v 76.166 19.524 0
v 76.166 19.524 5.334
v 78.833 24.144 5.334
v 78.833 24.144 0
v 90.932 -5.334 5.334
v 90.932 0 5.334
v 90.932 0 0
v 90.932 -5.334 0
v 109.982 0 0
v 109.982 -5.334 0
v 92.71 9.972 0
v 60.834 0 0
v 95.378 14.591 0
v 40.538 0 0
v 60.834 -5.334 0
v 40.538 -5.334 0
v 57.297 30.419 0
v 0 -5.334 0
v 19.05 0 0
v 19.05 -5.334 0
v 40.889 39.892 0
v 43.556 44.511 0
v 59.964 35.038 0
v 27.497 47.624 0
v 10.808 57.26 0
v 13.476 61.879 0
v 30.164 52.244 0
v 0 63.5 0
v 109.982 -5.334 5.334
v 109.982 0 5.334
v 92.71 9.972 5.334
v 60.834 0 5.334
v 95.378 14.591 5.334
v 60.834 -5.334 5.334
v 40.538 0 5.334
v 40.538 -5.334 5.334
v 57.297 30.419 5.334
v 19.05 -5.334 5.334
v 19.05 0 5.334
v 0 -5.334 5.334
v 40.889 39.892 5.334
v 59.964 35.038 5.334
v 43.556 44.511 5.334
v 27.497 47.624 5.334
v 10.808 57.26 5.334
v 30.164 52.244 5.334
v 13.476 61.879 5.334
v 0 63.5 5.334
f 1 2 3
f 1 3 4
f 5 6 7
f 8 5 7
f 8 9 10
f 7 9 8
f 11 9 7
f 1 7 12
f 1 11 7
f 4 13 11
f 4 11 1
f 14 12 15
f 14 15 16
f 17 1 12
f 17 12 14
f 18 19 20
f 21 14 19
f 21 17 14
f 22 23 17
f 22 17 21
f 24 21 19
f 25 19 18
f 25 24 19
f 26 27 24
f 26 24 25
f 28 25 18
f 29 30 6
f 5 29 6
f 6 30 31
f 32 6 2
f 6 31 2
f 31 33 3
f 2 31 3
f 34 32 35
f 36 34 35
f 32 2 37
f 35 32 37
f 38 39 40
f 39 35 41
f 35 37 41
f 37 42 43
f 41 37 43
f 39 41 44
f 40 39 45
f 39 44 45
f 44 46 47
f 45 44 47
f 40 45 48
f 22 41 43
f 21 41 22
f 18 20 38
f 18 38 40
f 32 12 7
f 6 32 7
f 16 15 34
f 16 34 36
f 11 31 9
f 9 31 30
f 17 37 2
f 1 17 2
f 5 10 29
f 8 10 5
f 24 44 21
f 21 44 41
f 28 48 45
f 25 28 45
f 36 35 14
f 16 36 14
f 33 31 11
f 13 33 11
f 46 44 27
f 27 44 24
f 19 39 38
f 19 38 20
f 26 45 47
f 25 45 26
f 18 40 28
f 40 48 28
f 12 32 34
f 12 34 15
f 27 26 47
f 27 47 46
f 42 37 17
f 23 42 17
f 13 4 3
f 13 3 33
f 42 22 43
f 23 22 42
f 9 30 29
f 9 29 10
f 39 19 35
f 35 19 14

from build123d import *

# Parameters (mm, degrees)
SKETCH1_W           = 109.982
SKETCH1_H           = 63.5
BOSS_EXTRUDE1_DEPTH = 5.334
CUT_EXTRUDE1_DEPTH  = 128.109173076
SKETCH7_W           = 19.05
SKETCH7_H           = 5.334
SKETCH7_W_2         = 20.295839927
BOSS_EXTRUDE4_DEPTH = 5.334
SKETCH9_W           = 19.270046927
SKETCH9_H           = 5.334
SKETCH9_W_2         = 18.946166646
SKETCH9_W_3         = 19.104051368
BOSS_EXTRUDE6_DEPTH = 5.334


with BuildPart() as part:
    # Sketch1 → Boss-Extrude1 (new body)
    with BuildSketch(Plane.XY):
        with Locations((54.991, 31.75)):
            Rectangle(SKETCH1_W, SKETCH1_H)
    extrude(amount=BOSS_EXTRUDE1_DEPTH)

    # Sketch2 → Cut-Extrude1 (cut, through all)
    with BuildSketch(Plane.XY.offset(5.334)):
        Polygon((0, 63.5), (109.982, 0), (109.982, 63.5), align=None)
    extrude(amount=-CUT_EXTRUDE1_DEPTH, mode=Mode.SUBTRACT)

    # Sketch7 → Boss-Extrude4 (add)
    with BuildSketch(Plane(origin=(0, 0, 0), x_dir=(-1, 0, 0), z_dir=(0, -1, 0))):
        with Locations((-9.525, -2.667)):
            Rectangle(SKETCH7_W, SKETCH7_H)
        with Locations((-50.685821834, -2.667)):
            Rectangle(SKETCH7_W_2, SKETCH7_H)
        with Locations((-100.457, -2.667)):
            Rectangle(SKETCH7_W, SKETCH7_H)
    extrude(amount=BOSS_EXTRUDE4_DEPTH)

    # Sketch9 → Boss-Extrude6 (add)
    with BuildSketch(Plane(origin=(27.496709855, 47.624301469, 0), x_dir=(0.866019052628739, -0.5000110003630135, 0), z_dir=(0.5000110003630134, 0.8660190526287389, 0))):
        with Locations((-9.635023464, -2.667)):
            Rectangle(SKETCH9_W, SKETCH9_H)
        with Locations((24.937675247, -2.667)):
            Rectangle(SKETCH9_W_2, SKETCH9_H)
        with Locations((65.750875897, -2.667)):
            Rectangle(SKETCH9_W_3, SKETCH9_H)
    extrude(amount=BOSS_EXTRUDE6_DEPTH)


solid = part.part
